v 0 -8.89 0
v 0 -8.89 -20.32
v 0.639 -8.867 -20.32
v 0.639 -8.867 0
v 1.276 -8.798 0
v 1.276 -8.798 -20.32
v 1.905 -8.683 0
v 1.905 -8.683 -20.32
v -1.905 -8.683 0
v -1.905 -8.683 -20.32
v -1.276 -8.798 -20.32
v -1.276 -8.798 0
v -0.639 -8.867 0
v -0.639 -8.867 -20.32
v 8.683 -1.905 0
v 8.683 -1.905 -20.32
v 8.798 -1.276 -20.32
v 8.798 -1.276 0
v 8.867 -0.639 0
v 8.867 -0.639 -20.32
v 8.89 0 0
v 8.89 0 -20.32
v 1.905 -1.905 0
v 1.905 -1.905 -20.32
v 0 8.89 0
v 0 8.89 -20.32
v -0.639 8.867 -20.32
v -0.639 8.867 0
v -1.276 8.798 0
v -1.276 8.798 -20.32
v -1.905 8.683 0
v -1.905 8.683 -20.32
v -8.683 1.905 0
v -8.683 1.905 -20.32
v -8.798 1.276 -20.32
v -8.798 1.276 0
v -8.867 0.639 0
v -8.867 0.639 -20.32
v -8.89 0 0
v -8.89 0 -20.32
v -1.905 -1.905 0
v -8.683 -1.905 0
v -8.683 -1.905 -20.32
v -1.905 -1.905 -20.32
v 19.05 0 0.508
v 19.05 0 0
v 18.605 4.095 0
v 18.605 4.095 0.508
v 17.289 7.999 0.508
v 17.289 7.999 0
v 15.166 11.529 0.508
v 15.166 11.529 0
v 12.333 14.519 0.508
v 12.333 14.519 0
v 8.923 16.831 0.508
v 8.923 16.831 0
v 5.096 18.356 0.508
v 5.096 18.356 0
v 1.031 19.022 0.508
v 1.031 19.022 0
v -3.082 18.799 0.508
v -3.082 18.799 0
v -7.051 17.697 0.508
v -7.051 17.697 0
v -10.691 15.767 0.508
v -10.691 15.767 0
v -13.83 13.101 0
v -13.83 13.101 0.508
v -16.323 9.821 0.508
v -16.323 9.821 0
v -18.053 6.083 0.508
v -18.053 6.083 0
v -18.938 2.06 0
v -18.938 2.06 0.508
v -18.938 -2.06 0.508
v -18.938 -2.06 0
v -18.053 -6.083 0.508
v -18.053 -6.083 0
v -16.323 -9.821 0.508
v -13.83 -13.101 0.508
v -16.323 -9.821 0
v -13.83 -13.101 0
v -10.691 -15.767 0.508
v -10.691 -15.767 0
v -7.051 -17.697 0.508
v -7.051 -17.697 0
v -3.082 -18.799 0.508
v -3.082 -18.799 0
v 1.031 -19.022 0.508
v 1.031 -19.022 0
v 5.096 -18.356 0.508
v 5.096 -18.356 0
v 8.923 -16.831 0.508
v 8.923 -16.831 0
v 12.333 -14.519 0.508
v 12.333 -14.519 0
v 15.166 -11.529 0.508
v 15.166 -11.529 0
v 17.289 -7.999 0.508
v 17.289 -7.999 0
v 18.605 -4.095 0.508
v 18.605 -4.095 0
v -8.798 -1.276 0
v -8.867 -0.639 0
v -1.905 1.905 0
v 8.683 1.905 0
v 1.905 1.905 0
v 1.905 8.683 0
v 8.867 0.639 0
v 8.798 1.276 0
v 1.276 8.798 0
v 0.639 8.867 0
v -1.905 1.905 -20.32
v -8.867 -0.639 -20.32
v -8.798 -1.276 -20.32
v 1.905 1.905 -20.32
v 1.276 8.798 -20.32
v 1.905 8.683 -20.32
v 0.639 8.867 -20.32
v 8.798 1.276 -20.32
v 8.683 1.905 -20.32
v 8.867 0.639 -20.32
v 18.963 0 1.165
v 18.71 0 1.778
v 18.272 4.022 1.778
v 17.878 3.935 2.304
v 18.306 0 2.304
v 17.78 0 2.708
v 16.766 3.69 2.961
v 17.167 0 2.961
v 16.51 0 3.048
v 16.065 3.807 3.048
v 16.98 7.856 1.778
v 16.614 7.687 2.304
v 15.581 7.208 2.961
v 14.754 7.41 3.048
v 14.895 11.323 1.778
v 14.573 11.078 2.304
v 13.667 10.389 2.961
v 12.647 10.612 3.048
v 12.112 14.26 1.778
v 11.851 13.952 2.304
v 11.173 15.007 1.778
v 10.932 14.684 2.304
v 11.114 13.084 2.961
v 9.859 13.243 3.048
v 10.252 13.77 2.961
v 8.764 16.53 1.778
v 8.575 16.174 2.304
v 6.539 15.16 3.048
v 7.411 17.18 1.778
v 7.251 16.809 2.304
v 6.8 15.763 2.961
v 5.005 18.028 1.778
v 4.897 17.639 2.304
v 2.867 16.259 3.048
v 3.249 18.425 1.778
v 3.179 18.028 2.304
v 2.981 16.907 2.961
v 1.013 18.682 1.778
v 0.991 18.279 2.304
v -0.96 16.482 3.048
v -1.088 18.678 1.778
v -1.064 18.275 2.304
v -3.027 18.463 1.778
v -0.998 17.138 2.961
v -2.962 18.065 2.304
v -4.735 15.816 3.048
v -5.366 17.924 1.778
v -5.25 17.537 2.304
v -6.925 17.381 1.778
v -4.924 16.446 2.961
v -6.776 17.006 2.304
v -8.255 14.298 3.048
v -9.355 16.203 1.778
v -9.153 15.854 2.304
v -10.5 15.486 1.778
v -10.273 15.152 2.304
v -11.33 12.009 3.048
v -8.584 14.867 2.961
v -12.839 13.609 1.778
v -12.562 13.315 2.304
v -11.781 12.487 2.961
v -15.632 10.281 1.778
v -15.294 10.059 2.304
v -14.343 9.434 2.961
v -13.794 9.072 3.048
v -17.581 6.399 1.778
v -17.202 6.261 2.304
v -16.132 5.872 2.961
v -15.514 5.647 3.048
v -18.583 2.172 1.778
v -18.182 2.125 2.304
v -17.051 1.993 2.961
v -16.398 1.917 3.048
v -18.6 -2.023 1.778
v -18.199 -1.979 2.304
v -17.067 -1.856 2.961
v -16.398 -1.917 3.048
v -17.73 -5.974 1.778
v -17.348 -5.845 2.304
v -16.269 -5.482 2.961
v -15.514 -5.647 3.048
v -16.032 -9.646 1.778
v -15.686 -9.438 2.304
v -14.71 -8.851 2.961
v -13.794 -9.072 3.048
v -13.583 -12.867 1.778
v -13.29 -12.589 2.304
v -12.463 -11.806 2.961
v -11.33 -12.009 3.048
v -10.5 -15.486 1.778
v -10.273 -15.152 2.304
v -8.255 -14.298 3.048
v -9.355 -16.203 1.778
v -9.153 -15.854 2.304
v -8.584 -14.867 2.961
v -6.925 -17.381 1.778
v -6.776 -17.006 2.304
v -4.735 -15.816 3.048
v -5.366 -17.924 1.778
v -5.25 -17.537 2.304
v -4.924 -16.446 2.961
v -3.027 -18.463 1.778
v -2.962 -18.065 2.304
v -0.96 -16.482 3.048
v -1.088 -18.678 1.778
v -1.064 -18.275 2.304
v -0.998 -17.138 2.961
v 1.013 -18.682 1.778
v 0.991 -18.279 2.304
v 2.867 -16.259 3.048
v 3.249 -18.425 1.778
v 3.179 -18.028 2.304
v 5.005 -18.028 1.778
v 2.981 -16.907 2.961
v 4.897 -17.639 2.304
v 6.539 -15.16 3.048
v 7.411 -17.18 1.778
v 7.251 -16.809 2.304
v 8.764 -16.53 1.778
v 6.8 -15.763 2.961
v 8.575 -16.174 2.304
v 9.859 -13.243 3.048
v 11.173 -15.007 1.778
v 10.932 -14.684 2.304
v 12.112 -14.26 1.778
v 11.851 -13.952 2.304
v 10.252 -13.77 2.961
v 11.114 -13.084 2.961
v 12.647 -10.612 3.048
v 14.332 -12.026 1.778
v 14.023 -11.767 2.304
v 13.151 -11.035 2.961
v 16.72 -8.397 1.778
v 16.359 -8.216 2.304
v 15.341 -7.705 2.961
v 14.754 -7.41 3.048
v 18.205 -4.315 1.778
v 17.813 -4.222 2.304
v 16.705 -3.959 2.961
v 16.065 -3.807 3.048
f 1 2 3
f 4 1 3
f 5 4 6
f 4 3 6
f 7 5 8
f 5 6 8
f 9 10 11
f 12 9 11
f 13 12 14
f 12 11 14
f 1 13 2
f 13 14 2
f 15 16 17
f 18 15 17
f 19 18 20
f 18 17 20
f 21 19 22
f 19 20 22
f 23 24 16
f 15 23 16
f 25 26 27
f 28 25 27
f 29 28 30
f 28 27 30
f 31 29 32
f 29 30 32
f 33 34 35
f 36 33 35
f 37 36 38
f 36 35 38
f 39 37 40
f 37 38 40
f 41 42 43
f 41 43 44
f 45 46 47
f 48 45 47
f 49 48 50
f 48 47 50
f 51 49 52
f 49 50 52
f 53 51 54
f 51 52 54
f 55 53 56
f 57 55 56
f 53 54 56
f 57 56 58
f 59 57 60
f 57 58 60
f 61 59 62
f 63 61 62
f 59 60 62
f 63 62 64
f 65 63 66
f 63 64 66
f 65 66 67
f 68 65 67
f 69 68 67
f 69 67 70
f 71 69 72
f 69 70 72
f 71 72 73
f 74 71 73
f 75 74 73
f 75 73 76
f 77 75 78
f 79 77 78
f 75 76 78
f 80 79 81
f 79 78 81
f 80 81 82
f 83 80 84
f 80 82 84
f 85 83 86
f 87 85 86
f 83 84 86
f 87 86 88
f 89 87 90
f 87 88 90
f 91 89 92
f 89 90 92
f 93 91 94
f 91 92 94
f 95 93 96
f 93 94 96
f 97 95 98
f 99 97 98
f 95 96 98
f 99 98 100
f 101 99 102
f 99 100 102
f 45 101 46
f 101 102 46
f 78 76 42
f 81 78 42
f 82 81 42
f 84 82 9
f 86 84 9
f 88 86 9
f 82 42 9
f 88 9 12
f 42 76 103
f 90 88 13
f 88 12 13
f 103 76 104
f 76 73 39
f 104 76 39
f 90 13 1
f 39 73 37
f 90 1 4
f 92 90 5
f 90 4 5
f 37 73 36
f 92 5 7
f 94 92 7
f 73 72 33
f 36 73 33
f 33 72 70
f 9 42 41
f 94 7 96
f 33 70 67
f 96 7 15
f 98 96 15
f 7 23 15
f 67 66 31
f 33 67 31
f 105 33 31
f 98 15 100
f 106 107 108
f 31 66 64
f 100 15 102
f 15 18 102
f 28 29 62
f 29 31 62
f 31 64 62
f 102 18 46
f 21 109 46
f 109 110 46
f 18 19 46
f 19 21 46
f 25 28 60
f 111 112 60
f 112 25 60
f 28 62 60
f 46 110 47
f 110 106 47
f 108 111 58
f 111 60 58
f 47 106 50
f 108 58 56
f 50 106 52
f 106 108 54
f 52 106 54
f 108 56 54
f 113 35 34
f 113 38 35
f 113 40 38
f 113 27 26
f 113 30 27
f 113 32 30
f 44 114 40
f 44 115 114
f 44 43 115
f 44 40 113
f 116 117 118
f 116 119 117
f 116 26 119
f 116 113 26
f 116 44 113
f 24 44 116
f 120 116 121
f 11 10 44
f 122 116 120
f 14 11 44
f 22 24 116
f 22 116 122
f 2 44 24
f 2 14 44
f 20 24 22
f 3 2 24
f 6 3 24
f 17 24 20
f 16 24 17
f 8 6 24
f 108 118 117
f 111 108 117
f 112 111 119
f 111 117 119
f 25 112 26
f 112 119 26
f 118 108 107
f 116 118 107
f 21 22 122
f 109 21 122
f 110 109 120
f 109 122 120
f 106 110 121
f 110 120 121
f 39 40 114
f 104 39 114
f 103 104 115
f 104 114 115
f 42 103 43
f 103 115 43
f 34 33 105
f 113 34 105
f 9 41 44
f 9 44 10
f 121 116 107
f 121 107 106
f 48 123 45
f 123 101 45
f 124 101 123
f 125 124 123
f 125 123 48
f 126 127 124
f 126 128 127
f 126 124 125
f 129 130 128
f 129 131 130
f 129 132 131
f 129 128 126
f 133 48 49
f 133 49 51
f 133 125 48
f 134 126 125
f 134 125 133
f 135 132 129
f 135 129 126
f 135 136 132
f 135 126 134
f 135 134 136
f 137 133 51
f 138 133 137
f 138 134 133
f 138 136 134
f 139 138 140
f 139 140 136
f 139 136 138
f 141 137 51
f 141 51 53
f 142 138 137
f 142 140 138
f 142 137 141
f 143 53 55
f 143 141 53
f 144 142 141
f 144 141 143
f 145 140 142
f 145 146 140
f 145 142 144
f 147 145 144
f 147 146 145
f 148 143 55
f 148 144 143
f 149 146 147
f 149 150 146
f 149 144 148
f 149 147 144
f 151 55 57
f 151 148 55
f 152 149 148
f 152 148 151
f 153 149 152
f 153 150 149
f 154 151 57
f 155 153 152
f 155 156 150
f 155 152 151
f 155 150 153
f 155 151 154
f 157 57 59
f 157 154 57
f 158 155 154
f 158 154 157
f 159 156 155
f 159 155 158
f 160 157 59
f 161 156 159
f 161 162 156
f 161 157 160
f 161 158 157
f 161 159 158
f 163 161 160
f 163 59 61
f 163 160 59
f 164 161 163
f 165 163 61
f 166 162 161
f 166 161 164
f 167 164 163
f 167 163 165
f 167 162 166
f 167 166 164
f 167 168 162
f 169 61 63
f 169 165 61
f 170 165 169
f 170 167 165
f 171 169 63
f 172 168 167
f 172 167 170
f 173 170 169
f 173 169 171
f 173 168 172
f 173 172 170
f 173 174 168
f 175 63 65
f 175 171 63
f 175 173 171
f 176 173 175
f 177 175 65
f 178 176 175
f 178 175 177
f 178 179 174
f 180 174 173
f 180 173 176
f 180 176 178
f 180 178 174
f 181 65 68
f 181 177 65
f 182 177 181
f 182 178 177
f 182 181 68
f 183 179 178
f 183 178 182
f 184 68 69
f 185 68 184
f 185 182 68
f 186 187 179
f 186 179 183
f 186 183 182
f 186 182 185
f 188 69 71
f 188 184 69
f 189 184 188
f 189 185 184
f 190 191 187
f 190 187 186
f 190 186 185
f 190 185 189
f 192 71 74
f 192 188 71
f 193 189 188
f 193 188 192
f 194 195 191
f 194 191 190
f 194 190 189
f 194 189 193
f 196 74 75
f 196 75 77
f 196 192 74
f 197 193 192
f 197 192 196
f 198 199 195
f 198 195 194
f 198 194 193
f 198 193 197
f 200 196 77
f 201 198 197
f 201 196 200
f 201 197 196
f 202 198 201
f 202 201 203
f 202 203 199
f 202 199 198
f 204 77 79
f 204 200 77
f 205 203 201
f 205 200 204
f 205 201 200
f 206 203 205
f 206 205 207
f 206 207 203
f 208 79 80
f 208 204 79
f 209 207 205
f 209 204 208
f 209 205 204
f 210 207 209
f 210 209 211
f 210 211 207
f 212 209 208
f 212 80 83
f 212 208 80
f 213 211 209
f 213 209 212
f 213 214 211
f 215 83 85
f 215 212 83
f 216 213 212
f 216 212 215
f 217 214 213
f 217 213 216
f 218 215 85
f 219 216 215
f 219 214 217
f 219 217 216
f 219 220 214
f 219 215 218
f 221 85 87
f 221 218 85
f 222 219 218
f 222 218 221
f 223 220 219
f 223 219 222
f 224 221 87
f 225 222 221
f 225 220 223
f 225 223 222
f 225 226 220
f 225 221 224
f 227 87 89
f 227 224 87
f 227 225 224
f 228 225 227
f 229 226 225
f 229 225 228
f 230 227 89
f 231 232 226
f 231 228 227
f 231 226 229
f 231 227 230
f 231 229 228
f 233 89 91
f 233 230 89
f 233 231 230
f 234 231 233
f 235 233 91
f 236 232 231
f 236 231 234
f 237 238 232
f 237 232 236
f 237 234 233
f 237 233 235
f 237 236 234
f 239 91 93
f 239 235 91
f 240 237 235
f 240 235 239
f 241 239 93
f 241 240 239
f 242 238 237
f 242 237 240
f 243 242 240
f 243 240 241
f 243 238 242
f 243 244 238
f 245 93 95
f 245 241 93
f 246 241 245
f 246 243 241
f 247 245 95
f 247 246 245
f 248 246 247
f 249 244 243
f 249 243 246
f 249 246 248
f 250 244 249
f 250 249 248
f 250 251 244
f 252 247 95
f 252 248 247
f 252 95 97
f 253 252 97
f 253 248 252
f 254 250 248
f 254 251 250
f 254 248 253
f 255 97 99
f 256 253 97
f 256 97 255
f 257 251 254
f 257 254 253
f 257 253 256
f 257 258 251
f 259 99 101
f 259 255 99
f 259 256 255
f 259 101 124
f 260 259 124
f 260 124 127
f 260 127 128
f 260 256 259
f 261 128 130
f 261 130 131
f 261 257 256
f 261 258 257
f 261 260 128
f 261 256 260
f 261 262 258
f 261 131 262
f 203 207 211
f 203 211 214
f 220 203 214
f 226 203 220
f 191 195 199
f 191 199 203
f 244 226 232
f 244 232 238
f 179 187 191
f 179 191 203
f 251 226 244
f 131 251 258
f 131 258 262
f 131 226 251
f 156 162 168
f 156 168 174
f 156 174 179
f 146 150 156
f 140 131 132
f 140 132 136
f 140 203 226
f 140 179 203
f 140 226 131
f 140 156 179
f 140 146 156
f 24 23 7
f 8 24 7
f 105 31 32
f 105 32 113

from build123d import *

# Parameters (mm, degrees)
F0_R      = 19.05
F1_DEPTH  = 3.048
F2_R      = 2.54
F3_W      = 17.78
F3_H      = 3.81
F4_W      = 3.81
F4_H      = 6.985
F4_W_2    = 6.985
F4_H_2    = 3.81
F5_DEPTH  = 20.32
F7_DEPTH  = 20.32
F8_DEPTH  = 20.32
F9_DEPTH  = 20.32
F10_DEPTH = 20.32
F11_DEPTH = 20.32


with BuildPart() as f1:
    # F0 (on Top) → F1 (new body)
    with BuildSketch(Plane.XY):
        Circle(F0_R)
    extrude(amount=F1_DEPTH)

    # F2
    f2_edges = [f1.edges().sort_by_distance(p)[0] for p in [
        (-19.05, 0, 3.048),
    ]]
    fillet(f2_edges, radius=F2_R)

    # F3 (on face) + F4 (on face) → F5 (join)
    with BuildSketch(Plane(origin=(0, 0, 0), x_dir=(1, 0, 0), z_dir=(0, 0, -1))):
        Rectangle(F3_W, F3_H)
    with BuildSketch(Plane(origin=(0, 0, 0), x_dir=(1, 0, 0), z_dir=(0, 0, -1))):
        with Locations((0, -5.3975)):
            Rectangle(F4_W, F4_H)
        with Locations((0, 5.3975)):
            Rectangle(F4_W, F4_H)
        with Locations((-5.3975, 0)):
            Rectangle(F4_W_2, F4_H_2)
        with Locations((5.3975, 0)):
            Rectangle(F4_W_2, F4_H_2)
        Rectangle(F4_W, F4_H_2)
    extrude(amount=F5_DEPTH)

    # F6 (on face) → F7 (cut)
    with BuildSketch(Plane(origin=(0, 0, -20.32), x_dir=(1, 0, 0), z_dir=(0, 0, -1))):
        with BuildLine():
            ThreePointArc((0, 8.89), (0.9580800544, 8.8382228196), (1.905, 8.6834944003))
            Line((1.905, 8.6834944003), (1.905, 8.89))
            Line((1.905, 8.89), (0, 8.89))
        make_face()
    extrude(amount=-F7_DEPTH, mode=Mode.SUBTRACT)

    # F6 (on face) → F8 (cut)
    with BuildSketch(Plane(origin=(0, 0, -20.32), x_dir=(1, 0, 0), z_dir=(0, 0, -1))):
        with BuildLine():
            ThreePointArc((-1.905, 8.6834944003), (-0.9580800544, 8.8382228196), (0, 8.89))
            Line((0, 8.89), (-1.905, 8.89))
            Line((-1.905, 8.89), (-1.905, 8.6834944003))
        make_face()
    extrude(amount=-F8_DEPTH, mode=Mode.SUBTRACT)

    # F6 (on face) → F9 (cut)
    with BuildSketch(Plane(origin=(0, 0, -20.32), x_dir=(1, 0, 0), z_dir=(0, 0, -1))):
        with BuildLine():
            Line((-8.89, -1.905), (-8.6834944003, -1.905))
            ThreePointArc((-8.6834944003, -1.905), (-8.8382228196, -0.9580800544), (-8.89, 0))
            Line((-8.89, 0), (-8.89, -1.905))
        make_face()
    extrude(amount=-F9_DEPTH, mode=Mode.SUBTRACT)

    # F6 (on face) → F10 (cut)
    with BuildSketch(Plane(origin=(0, 0, -20.32), x_dir=(1, 0, 0), z_dir=(0, 0, -1))):
        with BuildLine():
            ThreePointArc((-8.89, 0), (-8.8382228196, 0.9580800544), (-8.6834944003, 1.905))
            Line((-8.6834944003, 1.905), (-8.89, 1.905))
            Line((-8.89, 1.905), (-8.89, 0))
        make_face()
    extrude(amount=-F10_DEPTH, mode=Mode.SUBTRACT)

    # F6 (on face) → F11 (cut)
    with BuildSketch(Plane(origin=(0, 0, -20.32), x_dir=(1, 0, 0), z_dir=(0, 0, -1))):
        with BuildLine():
            Line((1.905, -8.89), (1.905, -8.6834944003))
            ThreePointArc((1.905, -8.6834944003), (0.9580800544, -8.8382228196), (0, -8.89))
            Line((0, -8.89), (1.905, -8.89))
        make_face()
        with BuildLine():
            Line((-1.905, -8.89), (0, -8.89))
            ThreePointArc((0, -8.89), (-0.9580800544, -8.8382228196), (-1.905, -8.6834944003))
            Line((-1.905, -8.6834944003), (-1.905, -8.89))
        make_face()
        with BuildLine():
            Line((8.89, -1.905), (8.89, 0))
            ThreePointArc((8.89, 0), (8.8382228196, -0.9580800544), (8.6834944003, -1.905))
            Line((8.6834944003, -1.905), (8.89, -1.905))
        make_face()
        with BuildLine():
            ThreePointArc((8.6834944003, 1.905), (8.8382228196, 0.9580800544), (8.89, 0))
            Line((8.89, 0), (8.89, 1.905))
            Line((8.89, 1.905), (8.6834944003, 1.905))
        make_face()
    extrude(amount=-F11_DEPTH, mode=Mode.SUBTRACT)


solid = f1.part
